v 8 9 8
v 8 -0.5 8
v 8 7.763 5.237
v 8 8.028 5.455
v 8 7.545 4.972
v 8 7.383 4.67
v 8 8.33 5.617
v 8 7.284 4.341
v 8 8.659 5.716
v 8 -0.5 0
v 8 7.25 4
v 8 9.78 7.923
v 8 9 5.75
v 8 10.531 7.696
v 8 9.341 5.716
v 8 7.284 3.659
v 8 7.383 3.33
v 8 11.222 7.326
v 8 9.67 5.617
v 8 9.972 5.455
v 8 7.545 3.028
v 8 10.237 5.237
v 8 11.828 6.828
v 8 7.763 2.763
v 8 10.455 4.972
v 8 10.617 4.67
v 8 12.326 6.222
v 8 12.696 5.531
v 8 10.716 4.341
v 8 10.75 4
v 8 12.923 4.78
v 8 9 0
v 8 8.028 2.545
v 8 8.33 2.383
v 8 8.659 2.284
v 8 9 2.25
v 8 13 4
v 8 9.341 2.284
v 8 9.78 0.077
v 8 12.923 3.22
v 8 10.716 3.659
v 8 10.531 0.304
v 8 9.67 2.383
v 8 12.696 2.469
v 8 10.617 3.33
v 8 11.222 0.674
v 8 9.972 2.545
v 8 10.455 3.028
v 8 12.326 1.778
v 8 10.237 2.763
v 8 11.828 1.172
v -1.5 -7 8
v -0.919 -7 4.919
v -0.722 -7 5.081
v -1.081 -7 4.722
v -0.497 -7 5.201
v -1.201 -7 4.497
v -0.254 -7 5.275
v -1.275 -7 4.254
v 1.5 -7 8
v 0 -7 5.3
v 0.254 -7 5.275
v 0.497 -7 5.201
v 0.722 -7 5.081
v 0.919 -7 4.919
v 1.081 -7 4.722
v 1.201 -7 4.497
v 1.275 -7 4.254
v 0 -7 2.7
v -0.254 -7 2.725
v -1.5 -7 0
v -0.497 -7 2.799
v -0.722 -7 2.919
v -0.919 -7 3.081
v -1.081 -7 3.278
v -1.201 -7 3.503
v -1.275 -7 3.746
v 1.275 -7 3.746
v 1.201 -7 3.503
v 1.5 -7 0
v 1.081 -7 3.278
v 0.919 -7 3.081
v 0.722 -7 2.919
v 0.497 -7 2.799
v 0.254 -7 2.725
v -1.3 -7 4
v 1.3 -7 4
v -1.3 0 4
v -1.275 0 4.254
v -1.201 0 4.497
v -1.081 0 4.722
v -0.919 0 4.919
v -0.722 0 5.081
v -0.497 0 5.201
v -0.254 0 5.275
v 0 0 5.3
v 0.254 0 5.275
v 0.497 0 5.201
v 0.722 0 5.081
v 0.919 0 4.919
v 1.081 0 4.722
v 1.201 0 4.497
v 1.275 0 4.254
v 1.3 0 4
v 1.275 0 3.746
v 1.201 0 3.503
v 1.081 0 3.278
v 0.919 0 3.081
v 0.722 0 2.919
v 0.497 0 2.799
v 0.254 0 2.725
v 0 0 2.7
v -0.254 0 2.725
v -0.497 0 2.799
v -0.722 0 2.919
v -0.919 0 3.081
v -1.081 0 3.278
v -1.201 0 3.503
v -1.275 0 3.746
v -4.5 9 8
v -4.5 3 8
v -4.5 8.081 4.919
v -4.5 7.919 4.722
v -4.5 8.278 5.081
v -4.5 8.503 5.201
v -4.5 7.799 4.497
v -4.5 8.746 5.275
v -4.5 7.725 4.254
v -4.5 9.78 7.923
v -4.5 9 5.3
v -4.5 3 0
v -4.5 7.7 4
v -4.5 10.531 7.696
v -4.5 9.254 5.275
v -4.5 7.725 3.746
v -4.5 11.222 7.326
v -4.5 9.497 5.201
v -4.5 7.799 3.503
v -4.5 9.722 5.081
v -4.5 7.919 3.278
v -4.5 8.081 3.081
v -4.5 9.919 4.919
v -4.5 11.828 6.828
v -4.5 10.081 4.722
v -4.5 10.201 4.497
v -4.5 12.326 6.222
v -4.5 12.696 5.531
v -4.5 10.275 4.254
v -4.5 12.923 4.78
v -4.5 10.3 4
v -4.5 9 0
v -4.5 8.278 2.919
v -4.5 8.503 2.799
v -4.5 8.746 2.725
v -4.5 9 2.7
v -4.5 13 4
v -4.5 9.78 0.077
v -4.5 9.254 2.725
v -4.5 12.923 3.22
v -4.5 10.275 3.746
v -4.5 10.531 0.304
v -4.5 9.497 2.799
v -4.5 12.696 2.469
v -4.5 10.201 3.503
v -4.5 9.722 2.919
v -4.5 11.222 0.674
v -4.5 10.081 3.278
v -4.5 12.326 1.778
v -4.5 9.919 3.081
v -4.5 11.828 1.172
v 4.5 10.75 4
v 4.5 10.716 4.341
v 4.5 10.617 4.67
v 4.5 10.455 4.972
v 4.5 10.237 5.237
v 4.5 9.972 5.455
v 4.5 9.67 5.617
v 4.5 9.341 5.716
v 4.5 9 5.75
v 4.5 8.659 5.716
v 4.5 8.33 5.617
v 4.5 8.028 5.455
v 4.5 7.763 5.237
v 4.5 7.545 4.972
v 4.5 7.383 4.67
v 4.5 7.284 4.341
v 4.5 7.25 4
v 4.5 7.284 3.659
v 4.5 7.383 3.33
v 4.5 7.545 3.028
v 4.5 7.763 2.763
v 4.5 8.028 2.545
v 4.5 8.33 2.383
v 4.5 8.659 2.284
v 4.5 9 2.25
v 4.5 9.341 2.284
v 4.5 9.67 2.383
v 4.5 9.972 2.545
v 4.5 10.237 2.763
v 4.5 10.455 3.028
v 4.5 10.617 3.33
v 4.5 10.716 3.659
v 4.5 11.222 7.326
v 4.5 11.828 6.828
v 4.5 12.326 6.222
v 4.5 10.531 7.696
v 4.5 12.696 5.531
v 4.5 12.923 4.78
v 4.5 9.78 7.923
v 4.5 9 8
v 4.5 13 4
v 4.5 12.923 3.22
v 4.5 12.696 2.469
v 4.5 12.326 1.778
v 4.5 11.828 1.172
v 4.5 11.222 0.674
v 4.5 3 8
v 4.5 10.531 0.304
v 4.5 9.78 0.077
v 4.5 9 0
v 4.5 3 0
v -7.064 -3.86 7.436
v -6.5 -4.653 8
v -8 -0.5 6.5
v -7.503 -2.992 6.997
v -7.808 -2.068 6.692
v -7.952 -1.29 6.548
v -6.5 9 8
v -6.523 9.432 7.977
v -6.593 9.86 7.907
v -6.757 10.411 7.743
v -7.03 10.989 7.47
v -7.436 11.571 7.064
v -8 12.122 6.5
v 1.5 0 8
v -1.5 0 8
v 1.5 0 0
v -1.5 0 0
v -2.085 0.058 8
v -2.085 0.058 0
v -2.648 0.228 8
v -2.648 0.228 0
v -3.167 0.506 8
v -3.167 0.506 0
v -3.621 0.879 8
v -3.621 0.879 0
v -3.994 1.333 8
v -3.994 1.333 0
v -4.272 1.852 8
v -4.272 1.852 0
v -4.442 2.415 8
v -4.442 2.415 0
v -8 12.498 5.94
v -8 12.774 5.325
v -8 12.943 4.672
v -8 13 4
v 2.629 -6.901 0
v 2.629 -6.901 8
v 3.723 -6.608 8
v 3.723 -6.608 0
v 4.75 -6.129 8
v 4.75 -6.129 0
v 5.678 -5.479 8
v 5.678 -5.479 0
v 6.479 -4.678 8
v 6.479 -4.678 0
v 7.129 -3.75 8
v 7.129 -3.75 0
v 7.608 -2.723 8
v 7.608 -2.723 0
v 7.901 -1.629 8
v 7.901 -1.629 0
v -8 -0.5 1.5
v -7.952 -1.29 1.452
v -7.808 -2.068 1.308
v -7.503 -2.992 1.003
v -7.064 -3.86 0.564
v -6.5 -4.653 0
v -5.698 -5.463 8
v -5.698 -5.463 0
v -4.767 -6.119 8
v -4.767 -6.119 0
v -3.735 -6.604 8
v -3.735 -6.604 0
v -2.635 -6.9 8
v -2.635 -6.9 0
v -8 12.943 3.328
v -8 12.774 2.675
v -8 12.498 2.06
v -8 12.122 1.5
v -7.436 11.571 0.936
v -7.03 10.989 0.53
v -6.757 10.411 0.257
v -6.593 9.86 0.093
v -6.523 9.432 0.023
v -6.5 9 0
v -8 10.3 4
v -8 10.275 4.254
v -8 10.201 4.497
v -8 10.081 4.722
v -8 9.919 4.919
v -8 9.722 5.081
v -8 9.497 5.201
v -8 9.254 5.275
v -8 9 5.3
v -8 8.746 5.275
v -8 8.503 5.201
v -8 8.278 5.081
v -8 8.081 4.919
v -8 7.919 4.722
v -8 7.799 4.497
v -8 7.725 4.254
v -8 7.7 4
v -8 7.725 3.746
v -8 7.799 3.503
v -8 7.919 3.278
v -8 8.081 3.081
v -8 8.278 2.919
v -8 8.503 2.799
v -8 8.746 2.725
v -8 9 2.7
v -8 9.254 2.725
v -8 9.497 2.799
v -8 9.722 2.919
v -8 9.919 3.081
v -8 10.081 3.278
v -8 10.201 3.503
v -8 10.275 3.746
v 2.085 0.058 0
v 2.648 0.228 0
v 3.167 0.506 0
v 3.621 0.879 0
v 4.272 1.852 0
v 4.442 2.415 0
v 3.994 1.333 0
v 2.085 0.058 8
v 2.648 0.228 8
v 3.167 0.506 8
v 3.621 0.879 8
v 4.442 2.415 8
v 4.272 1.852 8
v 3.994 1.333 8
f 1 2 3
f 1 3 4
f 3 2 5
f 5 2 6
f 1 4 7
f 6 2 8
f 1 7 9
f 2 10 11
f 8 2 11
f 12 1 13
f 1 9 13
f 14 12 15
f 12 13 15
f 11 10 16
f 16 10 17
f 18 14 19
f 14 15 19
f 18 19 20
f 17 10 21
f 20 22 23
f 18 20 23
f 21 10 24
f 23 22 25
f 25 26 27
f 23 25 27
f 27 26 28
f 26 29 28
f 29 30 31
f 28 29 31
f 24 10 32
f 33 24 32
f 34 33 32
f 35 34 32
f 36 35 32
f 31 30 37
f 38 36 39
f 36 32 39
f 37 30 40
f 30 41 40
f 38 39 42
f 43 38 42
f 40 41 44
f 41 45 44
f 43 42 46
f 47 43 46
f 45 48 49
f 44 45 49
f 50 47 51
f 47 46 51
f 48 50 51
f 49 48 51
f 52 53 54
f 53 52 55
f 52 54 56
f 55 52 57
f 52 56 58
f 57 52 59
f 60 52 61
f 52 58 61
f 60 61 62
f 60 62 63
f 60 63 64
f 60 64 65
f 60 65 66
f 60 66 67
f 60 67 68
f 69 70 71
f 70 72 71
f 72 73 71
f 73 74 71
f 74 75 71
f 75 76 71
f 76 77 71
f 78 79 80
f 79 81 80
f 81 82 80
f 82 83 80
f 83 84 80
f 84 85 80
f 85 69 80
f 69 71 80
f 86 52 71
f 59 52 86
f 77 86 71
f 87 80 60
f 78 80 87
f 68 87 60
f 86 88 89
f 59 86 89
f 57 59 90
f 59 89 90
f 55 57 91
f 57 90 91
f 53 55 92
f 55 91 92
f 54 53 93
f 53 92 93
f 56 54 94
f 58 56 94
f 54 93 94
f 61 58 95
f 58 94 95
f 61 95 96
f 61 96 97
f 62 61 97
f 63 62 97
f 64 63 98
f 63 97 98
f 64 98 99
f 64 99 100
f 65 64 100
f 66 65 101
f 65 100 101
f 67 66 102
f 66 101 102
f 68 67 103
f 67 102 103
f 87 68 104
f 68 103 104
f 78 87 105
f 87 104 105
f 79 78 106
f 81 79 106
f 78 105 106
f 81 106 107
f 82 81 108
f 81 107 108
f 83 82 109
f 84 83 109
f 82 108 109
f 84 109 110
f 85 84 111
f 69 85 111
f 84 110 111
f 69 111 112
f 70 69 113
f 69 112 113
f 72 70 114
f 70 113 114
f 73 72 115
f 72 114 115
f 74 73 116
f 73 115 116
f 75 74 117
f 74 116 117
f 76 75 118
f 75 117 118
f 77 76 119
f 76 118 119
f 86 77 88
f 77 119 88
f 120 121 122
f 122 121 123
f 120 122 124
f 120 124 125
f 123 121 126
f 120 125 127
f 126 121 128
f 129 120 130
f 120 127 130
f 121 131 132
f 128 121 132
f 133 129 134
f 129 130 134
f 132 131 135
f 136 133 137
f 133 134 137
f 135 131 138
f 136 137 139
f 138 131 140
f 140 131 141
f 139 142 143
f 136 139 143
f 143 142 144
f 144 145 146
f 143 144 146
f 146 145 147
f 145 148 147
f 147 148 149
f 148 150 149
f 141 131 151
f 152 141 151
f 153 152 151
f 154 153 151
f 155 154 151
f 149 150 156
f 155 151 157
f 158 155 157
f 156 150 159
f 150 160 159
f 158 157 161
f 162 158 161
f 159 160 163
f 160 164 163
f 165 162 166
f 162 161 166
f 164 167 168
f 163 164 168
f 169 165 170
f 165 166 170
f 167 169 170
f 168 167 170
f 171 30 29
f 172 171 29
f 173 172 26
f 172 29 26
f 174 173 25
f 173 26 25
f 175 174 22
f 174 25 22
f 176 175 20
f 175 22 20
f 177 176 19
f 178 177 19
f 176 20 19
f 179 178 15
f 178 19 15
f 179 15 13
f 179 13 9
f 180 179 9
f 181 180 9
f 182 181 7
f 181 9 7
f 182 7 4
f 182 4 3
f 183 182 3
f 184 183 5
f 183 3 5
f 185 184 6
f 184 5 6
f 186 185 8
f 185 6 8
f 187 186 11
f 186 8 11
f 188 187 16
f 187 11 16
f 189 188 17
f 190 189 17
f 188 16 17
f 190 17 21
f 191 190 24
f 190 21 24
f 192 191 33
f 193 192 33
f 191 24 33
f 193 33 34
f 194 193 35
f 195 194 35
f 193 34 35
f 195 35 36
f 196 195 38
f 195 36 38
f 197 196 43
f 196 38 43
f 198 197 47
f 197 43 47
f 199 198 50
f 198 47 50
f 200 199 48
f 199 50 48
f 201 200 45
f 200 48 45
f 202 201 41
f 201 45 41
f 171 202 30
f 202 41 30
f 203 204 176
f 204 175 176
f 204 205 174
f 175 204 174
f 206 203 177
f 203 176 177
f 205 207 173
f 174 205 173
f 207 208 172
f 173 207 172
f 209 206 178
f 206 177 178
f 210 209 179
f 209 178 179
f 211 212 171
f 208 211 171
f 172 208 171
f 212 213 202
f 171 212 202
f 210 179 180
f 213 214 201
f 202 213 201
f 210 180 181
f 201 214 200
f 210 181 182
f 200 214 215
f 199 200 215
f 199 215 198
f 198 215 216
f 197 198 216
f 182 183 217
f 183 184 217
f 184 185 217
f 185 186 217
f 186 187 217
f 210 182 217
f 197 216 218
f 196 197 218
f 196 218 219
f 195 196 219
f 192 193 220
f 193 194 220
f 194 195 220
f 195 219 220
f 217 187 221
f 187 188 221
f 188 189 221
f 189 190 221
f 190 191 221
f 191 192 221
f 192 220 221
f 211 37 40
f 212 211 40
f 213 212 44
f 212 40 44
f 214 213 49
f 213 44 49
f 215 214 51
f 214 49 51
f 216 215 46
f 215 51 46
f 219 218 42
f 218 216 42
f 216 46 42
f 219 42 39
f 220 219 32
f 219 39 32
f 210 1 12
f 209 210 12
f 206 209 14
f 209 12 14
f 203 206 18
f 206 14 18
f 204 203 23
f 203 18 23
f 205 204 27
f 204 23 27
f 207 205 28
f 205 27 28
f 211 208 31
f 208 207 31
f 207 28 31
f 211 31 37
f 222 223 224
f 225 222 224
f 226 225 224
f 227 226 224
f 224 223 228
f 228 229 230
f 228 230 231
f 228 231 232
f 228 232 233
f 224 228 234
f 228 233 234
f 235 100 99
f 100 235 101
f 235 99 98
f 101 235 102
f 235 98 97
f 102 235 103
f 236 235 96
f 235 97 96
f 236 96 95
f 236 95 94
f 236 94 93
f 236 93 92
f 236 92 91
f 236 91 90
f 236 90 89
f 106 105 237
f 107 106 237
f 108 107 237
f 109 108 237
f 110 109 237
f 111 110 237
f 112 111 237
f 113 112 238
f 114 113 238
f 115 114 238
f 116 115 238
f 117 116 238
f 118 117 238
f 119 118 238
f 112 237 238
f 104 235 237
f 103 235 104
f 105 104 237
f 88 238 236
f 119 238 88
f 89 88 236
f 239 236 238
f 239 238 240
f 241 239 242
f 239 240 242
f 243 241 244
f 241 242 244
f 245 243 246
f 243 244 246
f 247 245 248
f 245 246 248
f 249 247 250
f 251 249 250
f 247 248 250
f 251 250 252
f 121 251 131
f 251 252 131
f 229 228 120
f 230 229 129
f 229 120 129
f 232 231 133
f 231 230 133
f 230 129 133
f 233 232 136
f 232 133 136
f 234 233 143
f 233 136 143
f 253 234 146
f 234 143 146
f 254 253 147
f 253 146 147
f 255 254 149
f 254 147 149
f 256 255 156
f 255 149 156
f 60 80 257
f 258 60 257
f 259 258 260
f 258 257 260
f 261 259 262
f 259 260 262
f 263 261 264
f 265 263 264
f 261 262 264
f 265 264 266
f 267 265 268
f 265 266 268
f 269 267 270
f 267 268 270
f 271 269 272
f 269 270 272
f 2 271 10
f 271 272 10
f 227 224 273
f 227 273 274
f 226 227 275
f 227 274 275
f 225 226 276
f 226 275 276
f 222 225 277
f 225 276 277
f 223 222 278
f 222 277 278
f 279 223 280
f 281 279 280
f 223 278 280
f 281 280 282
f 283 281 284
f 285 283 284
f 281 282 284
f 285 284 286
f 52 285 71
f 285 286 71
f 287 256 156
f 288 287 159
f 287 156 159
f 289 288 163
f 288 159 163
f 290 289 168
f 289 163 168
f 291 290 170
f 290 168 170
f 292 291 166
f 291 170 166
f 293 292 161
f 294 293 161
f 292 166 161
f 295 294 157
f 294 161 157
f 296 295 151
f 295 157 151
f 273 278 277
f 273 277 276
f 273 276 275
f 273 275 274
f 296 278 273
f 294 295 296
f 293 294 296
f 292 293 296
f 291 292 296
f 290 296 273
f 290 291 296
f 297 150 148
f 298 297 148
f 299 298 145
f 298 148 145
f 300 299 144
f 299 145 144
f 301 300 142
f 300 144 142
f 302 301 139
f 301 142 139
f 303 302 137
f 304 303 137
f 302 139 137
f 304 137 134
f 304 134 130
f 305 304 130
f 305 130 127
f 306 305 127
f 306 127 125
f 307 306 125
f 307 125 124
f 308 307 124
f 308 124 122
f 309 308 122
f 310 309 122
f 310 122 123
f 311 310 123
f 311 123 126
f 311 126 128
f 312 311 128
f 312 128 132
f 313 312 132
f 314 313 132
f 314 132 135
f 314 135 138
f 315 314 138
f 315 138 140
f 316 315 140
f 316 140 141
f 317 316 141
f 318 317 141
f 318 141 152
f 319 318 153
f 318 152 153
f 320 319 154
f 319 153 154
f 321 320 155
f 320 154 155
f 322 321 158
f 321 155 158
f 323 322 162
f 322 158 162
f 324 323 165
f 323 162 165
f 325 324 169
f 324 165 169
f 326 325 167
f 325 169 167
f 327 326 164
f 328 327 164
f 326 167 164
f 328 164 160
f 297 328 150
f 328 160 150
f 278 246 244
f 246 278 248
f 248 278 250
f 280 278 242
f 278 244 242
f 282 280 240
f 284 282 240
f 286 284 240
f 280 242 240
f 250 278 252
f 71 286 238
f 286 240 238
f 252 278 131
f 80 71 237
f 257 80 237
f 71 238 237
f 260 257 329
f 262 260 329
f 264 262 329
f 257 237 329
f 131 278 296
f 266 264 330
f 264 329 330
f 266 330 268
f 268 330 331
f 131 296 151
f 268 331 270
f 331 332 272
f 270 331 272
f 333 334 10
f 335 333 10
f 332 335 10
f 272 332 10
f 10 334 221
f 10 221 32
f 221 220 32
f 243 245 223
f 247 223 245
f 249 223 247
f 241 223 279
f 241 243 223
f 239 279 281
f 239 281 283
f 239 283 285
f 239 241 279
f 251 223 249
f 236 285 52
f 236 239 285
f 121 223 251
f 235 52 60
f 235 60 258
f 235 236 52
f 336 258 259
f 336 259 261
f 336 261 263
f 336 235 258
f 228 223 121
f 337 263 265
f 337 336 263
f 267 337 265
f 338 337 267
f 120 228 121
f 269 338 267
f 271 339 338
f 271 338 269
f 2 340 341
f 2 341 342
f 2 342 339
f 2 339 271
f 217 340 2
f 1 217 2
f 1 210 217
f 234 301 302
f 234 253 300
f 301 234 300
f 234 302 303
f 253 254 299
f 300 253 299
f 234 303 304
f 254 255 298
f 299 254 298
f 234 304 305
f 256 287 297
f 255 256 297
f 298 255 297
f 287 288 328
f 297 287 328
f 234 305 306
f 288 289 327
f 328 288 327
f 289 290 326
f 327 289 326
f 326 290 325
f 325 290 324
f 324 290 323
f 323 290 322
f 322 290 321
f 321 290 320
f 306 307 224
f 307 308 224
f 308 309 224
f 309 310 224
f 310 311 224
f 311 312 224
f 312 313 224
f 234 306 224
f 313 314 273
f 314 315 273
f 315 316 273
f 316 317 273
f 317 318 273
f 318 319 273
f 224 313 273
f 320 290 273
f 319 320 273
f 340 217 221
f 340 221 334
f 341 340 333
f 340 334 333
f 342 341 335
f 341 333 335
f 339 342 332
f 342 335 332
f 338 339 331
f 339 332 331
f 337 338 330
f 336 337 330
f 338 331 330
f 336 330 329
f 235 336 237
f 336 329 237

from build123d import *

# Parameters (mm, degrees)
F1_DEPTH    = 8
F3_DEPTH    = 16.001
F2_R        = 1.3
F4_DEPTH    = 16.001
F2_R_2      = 1.75
F5_DEPTH    = 3.5
F6_R        = 1.3
F7_DEPTH    = 7
F8_T1_DEPTH = 19.9153161013


# Not quite as in the source:
# - a fillet or chamfer that OpenCascade refuses, or shapes differently, is made with other operations: its cross-section is extruded or revolved along the edge and cut away or added


with BuildPart() as f1:
    # F0 (on Top) → F1 (new body)
    with BuildSketch(Plane.XY):
        with BuildLine():
            Line((-4.5, 3), (-4.5, 13))
            Line((-4.5, 13), (-8, 13))
            Line((-8, 13), (-8, -0.5))
            ThreePointArc((-8, -0.5), (-6.0961940777, -5.0961940777), (-1.5, -7))
            Line((-1.5, -7), (1.5, -7))
            ThreePointArc((1.5, -7), (6.0961940777, -5.0961940777), (8, -0.5))
            Line((8, -0.5), (8, 13))
            Line((8, 13), (4.5, 13))
            Line((4.5, 13), (4.5, 3))
            ThreePointArc((4.5, 3), (3.6213203436, 0.8786796564), (1.5, 0))
            Line((1.5, 0), (-1.5, 0))
            ThreePointArc((-1.5, 0), (-3.6213203436, 0.8786796564), (-4.5, 3))
        make_face()
    extrude(amount=F1_DEPTH)

    # F2 (on face) → F3 (cut, through all)
    with BuildSketch(Plane.YZ.offset(8)):
        with BuildLine():
            ThreePointArc((13, 4), (11.8284271247, 1.1715728753), (9, 0))
            Line((9, 0), (13, 0))
            Line((13, 0), (13, 4))
        make_face()
        with BuildLine():
            ThreePointArc((9, 8), (11.8284271247, 6.8284271247), (13, 4))
            Line((13, 4), (13, 8))
            Line((13, 8), (9, 8))
        make_face()
    extrude(amount=-F3_DEPTH, mode=Mode.SUBTRACT)

    # F2 (on face) → F4 (cut, through all)
    with BuildSketch(Plane.YZ.offset(8)):
        with Locations((9, 4)):
            Circle(F2_R)
    extrude(amount=-F4_DEPTH, mode=Mode.SUBTRACT)

    # F2 (on face) → F5 (cut, through all)
    with BuildSketch(Plane.YZ.offset(8)):
        with Locations((9, 4)):
            Circle(F2_R_2)
        with Locations((9, 4)):
            Circle(F2_R, mode=Mode.SUBTRACT)
    extrude(amount=-F5_DEPTH, mode=Mode.SUBTRACT)

    # F6 (on face) → F7 (cut, through all)
    with BuildSketch(Plane(origin=(0, 0, 0), x_dir=(-1, 0, 0), z_dir=(0, 1, 0))):
        with Locations((0, 4)):
            Circle(F6_R)
    extrude(amount=-F7_DEPTH, mode=Mode.SUBTRACT)

    # F8: chamfer of 1.5 on 2 edges, made by hand

    # F8_s2 → F8_t1 (cut)
    with BuildSketch(Plane.XZ.offset(-12.8575244819)):
        Polygon((-6.5, 0), (-8, 1.5), (-8, 0), align=None)
        Polygon((-6.5, 8), (-8, 6.5), (-8, 8), align=None)
    extrude(amount=F8_T1_DEPTH, mode=Mode.SUBTRACT)


solid = f1.part
